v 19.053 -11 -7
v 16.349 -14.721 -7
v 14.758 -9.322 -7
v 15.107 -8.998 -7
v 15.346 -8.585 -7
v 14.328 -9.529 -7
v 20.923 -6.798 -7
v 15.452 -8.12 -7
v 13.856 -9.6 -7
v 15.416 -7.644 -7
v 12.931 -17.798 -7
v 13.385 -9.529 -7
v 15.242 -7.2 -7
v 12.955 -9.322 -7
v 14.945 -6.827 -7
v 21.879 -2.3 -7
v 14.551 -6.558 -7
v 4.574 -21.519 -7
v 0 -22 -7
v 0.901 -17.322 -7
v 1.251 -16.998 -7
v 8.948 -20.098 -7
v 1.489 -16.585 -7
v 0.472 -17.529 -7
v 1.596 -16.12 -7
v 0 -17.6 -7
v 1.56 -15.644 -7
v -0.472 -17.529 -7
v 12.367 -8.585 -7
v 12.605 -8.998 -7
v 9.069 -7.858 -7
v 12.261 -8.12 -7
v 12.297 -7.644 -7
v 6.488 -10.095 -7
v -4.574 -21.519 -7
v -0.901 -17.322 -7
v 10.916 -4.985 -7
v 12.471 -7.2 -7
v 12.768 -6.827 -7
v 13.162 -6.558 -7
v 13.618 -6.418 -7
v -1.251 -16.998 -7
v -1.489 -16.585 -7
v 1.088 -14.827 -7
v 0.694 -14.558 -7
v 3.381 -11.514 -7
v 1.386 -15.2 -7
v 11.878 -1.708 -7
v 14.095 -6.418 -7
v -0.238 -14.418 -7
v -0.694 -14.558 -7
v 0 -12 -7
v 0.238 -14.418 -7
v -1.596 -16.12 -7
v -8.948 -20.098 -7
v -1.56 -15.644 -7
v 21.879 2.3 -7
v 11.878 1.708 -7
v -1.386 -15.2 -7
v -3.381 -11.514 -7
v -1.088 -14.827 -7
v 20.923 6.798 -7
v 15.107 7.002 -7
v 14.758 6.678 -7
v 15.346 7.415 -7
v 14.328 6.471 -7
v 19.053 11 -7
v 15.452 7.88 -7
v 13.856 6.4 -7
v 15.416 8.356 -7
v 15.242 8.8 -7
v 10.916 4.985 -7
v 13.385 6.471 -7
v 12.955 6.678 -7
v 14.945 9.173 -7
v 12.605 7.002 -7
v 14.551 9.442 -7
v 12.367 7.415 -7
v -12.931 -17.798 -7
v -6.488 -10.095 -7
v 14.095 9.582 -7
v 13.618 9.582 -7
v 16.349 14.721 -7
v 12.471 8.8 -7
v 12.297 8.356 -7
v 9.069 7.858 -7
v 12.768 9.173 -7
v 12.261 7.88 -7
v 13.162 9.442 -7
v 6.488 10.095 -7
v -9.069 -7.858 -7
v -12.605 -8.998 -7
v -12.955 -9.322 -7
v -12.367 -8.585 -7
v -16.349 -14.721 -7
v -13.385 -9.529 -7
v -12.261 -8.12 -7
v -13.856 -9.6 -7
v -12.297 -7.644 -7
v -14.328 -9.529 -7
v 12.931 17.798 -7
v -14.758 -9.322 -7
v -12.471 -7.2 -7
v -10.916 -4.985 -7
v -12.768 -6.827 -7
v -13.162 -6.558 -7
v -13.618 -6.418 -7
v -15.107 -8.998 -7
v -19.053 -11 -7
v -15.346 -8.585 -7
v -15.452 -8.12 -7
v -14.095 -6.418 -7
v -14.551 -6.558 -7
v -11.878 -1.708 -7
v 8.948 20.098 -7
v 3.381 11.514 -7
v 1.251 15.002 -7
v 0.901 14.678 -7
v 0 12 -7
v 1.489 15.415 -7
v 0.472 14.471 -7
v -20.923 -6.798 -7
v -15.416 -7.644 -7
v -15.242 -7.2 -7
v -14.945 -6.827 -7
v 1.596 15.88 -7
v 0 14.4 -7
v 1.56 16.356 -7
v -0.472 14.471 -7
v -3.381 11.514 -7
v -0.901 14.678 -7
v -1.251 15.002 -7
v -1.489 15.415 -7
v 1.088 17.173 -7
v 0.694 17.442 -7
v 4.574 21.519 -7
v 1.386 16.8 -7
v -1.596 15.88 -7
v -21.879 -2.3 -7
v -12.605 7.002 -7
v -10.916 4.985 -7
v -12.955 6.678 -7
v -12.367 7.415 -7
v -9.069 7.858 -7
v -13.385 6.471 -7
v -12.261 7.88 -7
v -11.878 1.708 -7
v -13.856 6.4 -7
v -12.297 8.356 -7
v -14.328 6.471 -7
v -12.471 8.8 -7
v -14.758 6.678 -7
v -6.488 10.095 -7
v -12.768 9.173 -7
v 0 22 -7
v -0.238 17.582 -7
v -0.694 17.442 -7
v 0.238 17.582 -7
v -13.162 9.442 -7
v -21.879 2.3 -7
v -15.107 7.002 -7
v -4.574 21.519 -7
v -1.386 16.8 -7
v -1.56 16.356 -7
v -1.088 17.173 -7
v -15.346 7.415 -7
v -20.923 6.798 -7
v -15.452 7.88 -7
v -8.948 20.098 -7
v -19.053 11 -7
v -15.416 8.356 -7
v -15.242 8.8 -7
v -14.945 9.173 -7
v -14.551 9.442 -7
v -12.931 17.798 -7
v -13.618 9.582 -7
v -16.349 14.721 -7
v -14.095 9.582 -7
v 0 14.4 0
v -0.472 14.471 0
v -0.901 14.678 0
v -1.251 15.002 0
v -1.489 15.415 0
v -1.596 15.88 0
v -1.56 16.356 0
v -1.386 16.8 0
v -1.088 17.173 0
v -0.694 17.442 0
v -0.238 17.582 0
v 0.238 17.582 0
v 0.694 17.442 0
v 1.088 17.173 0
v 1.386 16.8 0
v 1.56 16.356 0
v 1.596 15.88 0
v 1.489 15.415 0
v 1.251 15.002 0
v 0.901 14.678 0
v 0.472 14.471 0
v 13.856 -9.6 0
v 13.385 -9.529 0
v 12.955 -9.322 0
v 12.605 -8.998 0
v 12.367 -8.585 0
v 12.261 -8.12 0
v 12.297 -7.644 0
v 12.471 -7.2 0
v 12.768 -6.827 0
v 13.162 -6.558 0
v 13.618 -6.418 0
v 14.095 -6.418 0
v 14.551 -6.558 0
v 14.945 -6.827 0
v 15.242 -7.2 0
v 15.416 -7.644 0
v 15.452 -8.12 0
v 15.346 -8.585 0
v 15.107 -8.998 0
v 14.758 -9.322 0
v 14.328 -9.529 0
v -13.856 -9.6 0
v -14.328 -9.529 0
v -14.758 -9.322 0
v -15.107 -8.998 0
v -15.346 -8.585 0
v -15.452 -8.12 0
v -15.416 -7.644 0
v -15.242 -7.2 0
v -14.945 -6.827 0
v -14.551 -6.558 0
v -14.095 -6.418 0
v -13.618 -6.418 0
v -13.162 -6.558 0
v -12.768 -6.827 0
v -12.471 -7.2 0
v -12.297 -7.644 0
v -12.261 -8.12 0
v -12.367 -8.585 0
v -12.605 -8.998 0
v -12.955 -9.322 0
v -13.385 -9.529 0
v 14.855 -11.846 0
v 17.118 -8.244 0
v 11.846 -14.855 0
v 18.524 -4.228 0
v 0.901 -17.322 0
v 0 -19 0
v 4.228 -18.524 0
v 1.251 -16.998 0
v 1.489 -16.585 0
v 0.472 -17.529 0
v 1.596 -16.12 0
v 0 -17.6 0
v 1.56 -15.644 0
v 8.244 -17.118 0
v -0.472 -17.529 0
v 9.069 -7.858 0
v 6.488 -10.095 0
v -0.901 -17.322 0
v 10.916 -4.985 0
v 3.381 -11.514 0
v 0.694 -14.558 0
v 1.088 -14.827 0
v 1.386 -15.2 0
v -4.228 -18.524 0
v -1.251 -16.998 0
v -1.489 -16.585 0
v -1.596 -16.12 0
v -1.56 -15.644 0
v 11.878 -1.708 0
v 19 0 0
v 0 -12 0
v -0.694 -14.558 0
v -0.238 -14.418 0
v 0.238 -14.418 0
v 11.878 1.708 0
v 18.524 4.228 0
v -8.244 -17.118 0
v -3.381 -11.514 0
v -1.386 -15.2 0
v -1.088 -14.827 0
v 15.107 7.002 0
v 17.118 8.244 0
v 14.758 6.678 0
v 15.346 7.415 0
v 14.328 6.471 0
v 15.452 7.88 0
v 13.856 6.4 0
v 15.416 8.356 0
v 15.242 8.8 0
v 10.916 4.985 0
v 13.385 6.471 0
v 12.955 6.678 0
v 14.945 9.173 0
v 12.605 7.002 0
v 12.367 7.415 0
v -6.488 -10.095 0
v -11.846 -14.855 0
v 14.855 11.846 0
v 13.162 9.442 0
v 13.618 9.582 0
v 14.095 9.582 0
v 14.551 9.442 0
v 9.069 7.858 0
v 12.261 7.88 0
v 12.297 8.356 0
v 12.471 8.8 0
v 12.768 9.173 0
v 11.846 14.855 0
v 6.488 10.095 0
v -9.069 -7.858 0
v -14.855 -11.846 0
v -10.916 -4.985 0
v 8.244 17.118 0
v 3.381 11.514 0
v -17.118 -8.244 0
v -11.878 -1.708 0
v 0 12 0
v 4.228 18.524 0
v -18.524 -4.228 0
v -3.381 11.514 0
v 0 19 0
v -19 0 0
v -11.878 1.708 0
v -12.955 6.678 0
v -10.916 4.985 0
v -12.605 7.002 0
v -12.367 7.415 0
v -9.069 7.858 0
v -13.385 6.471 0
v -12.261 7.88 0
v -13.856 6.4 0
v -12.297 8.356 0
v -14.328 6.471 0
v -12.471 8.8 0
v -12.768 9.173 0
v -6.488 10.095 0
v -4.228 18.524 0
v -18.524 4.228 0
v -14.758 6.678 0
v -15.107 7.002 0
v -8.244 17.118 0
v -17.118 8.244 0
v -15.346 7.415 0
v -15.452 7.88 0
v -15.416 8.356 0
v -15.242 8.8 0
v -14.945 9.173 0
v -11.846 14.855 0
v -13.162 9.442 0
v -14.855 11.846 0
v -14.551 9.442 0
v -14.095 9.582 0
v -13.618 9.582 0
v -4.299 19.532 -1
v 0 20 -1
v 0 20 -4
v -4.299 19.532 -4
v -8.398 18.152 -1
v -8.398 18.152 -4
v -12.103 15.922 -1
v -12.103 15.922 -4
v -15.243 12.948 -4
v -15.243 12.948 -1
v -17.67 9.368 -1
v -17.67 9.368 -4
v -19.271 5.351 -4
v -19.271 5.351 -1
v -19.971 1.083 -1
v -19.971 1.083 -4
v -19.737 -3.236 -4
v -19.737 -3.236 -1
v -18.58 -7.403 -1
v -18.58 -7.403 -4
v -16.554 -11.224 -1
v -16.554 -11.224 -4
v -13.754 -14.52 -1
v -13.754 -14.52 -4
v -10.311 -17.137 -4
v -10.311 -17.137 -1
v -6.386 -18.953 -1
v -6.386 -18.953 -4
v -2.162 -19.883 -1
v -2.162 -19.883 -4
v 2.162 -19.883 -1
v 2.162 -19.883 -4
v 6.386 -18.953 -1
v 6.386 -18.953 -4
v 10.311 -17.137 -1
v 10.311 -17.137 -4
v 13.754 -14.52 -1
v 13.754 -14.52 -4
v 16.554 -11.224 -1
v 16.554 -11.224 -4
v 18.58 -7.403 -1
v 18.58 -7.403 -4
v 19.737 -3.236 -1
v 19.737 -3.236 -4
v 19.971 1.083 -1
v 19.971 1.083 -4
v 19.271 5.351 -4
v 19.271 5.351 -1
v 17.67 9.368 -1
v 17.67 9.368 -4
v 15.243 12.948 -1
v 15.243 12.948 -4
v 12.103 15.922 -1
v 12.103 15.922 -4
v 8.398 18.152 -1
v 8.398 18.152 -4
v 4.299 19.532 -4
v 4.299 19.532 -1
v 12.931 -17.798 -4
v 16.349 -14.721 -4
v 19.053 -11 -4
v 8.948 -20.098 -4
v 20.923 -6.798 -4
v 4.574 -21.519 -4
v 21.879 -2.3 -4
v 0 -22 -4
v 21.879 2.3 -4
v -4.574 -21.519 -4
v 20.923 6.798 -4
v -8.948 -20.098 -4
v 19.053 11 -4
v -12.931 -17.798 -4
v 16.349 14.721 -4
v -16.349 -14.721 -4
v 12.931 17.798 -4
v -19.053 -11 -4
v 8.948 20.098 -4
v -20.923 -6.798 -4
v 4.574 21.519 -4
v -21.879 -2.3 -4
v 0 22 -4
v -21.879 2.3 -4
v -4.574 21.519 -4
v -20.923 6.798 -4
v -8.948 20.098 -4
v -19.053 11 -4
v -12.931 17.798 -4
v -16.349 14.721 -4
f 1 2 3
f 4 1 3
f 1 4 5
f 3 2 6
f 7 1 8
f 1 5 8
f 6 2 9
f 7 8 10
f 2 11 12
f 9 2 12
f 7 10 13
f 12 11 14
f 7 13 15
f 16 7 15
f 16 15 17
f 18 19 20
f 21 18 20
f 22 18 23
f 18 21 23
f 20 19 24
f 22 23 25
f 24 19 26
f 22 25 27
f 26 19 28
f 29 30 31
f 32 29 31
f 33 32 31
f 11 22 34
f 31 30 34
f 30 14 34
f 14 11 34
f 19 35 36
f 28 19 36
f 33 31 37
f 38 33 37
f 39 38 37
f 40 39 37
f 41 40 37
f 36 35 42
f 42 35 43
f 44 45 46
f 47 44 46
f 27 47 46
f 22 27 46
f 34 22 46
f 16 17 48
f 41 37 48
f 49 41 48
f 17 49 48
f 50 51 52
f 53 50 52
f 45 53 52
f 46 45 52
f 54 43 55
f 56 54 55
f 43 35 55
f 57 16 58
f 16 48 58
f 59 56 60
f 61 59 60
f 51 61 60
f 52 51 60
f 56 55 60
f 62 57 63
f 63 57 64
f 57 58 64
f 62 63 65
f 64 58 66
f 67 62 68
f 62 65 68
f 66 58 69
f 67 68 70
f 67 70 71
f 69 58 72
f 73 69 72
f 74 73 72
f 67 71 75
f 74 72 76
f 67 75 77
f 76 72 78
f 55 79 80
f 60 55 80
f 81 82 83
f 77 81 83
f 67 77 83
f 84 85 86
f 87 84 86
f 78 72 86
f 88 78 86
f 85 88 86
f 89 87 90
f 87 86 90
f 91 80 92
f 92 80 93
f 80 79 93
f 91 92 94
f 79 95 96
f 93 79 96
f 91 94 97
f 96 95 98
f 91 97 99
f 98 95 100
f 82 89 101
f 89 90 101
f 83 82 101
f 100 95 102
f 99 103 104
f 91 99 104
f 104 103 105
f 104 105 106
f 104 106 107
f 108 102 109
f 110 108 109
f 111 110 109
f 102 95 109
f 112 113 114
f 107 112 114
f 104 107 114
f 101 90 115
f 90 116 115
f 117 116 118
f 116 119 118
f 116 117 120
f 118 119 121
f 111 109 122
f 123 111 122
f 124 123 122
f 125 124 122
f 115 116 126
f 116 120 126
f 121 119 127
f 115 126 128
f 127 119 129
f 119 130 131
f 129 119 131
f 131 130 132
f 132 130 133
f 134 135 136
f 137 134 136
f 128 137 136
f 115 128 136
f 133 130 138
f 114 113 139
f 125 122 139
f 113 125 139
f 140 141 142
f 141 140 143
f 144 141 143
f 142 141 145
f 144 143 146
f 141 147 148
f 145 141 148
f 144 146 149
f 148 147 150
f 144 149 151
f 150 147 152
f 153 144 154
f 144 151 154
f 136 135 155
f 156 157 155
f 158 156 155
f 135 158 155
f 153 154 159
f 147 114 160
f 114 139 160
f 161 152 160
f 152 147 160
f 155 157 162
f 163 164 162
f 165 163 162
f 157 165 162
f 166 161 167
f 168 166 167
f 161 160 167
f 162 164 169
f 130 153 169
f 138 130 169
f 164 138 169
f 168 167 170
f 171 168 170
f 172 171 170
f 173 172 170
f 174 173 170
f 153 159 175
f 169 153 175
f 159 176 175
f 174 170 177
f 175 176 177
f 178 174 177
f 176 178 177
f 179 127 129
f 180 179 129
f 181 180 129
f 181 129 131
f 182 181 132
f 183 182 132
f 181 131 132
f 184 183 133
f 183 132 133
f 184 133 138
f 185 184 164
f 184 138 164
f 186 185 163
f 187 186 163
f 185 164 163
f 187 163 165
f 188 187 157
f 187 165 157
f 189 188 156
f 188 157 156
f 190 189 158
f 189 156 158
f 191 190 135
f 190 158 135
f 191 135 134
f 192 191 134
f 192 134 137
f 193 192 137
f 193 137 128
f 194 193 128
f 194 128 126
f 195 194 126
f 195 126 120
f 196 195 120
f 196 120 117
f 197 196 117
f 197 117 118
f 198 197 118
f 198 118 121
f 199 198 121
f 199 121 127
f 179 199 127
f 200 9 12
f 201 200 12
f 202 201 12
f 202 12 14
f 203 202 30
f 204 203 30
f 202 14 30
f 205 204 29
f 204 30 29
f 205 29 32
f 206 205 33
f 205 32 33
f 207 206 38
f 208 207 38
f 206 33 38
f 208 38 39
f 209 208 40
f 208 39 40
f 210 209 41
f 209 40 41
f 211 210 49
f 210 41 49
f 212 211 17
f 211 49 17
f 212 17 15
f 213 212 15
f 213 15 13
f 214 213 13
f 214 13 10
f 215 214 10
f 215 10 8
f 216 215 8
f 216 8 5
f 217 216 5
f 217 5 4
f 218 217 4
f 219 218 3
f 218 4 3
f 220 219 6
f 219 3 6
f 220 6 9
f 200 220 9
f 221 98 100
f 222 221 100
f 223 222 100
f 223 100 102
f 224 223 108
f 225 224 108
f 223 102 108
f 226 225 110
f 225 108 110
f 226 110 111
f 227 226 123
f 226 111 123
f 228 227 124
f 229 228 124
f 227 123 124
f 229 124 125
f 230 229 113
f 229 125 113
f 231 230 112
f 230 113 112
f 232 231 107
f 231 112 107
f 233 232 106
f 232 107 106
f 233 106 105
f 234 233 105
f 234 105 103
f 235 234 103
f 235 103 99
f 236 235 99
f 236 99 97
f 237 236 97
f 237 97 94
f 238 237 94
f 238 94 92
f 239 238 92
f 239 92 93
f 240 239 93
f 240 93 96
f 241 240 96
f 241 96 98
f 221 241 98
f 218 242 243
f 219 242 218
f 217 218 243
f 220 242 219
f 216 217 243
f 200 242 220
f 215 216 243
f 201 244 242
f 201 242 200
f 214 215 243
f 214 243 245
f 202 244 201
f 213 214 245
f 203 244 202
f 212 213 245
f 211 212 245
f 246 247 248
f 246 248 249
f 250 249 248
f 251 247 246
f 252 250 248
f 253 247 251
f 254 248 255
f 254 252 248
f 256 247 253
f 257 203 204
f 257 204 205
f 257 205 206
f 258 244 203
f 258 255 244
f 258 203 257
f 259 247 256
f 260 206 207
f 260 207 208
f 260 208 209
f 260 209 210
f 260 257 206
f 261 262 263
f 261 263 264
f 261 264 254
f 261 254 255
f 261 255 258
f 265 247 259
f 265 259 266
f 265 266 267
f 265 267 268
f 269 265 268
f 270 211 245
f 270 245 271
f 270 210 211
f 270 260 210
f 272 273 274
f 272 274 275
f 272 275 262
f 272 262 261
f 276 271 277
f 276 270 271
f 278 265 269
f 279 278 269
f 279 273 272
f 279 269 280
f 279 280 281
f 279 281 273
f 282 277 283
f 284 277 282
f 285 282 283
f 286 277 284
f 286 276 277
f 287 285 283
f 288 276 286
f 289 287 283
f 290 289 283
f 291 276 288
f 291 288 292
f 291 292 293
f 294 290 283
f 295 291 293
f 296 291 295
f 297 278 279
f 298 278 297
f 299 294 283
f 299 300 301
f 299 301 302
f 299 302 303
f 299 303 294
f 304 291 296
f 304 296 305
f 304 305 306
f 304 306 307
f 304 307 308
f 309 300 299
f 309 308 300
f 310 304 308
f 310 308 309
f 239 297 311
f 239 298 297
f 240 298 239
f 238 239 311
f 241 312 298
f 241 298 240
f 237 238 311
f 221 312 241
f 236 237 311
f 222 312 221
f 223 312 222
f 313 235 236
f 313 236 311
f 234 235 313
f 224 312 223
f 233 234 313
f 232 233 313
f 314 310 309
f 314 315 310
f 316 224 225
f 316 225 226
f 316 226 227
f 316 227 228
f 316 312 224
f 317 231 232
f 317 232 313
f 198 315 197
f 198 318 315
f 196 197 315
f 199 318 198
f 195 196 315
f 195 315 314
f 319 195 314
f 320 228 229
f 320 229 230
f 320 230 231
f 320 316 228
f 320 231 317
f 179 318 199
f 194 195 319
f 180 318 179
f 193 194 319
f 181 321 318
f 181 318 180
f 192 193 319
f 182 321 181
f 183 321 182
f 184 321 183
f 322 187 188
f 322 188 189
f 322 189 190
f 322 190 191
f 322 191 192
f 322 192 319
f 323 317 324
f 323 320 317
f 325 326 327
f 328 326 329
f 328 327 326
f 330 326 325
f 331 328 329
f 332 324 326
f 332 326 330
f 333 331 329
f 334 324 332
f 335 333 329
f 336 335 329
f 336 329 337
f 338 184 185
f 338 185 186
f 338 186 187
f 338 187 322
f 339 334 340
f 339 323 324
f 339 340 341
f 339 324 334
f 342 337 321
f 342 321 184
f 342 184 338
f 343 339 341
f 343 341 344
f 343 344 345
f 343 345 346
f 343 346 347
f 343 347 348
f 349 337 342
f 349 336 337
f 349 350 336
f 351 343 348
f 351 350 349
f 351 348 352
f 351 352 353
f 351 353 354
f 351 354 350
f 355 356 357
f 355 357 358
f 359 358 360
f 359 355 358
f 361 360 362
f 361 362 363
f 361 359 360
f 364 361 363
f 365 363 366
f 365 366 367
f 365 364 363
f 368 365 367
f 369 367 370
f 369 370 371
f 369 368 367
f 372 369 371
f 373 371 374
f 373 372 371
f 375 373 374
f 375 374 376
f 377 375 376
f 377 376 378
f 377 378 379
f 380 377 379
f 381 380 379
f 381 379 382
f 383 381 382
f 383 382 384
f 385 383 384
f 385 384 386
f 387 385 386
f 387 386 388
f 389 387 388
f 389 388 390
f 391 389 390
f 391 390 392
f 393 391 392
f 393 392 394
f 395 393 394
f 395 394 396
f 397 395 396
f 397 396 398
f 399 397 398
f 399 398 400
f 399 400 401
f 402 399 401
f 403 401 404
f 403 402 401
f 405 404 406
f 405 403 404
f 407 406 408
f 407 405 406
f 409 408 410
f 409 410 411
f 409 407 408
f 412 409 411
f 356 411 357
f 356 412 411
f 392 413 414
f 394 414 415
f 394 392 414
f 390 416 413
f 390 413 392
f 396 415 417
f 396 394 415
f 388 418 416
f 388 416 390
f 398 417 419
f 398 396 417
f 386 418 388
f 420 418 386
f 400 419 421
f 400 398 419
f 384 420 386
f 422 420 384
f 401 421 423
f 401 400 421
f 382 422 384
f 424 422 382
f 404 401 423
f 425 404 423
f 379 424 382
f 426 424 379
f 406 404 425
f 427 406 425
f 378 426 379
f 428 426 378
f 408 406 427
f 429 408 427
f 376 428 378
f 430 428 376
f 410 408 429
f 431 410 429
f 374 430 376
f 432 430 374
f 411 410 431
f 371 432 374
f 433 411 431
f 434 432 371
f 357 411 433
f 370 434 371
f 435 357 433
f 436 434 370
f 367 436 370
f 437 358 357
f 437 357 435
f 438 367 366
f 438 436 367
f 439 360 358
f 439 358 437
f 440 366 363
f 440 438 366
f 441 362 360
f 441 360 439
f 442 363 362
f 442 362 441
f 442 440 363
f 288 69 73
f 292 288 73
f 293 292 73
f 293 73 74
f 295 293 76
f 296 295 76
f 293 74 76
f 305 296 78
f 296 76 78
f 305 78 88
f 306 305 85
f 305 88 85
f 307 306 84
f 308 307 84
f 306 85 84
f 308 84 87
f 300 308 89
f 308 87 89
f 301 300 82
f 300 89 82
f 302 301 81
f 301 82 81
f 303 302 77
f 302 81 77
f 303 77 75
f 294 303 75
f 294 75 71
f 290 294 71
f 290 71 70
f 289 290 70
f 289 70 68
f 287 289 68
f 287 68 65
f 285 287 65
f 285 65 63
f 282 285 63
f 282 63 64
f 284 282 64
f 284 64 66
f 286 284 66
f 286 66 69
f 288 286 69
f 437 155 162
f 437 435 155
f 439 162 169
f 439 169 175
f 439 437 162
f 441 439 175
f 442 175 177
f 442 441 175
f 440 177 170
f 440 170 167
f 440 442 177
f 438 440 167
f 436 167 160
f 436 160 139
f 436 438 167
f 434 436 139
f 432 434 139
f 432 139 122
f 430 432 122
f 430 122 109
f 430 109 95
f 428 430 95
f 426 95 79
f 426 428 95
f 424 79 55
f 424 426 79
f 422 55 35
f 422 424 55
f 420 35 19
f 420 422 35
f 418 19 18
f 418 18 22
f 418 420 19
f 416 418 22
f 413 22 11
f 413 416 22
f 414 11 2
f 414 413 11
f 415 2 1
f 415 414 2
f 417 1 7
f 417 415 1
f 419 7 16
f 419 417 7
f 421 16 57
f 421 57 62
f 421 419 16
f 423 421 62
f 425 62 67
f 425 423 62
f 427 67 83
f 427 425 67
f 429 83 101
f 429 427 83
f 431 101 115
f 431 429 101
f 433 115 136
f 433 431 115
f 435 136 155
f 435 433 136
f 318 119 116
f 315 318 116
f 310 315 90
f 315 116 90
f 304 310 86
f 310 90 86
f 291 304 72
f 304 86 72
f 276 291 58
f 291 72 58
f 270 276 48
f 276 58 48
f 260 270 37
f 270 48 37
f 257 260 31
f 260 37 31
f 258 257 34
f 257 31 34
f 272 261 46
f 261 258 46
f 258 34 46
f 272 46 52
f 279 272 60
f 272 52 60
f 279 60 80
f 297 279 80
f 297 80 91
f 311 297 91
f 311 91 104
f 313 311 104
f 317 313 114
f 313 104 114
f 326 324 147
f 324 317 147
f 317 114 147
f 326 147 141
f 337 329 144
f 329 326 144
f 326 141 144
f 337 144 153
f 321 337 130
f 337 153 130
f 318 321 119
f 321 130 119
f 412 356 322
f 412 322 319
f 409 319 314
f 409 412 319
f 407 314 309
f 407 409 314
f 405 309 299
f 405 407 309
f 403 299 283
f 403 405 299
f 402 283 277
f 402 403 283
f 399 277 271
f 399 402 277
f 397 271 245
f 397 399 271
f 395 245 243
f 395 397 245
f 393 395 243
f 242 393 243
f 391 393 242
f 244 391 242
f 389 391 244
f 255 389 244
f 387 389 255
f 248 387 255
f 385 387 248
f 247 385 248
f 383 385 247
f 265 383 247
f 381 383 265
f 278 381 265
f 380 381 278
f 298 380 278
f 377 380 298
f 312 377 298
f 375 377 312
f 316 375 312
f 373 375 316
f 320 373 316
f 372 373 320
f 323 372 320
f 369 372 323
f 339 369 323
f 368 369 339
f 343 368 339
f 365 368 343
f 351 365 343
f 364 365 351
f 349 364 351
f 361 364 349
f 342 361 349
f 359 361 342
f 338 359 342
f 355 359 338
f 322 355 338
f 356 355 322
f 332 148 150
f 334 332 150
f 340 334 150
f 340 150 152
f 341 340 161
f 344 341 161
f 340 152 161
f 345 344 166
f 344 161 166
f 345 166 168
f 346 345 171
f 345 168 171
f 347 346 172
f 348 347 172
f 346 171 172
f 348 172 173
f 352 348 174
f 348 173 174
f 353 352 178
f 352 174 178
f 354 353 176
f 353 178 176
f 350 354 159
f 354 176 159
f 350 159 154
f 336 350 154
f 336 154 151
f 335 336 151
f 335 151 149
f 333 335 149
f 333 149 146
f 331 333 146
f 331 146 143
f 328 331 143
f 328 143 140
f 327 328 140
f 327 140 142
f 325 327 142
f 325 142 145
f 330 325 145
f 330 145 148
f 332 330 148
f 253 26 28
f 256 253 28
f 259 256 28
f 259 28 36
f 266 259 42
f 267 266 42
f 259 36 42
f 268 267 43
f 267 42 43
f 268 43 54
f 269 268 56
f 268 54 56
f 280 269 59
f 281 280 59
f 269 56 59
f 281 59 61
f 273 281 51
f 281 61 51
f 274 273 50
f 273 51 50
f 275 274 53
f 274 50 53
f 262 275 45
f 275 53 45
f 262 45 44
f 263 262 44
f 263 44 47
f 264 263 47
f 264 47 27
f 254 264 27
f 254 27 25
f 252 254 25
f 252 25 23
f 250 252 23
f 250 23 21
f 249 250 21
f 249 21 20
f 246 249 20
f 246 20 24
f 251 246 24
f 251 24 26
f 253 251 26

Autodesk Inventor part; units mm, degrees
ref_plane "YZ Plane" through (0, 0, 0) normal (1, 0, 0) x (0, 1, 0)
ref_plane "XZ Plane" through (0, 0, 0) normal (0, 1, 0) x (-1, 0, 0)
ref_plane "XY Plane" through (0, 0, 0) normal (0, 0, 1) x (1, 0, 0)
sketch "スケッチ1" plane through (0, 0, 0) normal (1, 0, 0) x (0, 1, 0)
  line L0 (12, 0) -> (12, -7)
  line L1 (22, -7) -> (22, -4)
  line L2 (22, -4) -> (20, -4)
  line L3 (20, -4) -> (20, 0)
  line L4 (20, 0) -> (12, 0)
  line L5 (0, -8.4) -> (0, 1.4) projected
  line L6 (22, -7) -> (12, -7)
  point P0 (0, 0)
  dimension "d0" = 20
  dimension "d1" = 2
  dimension "d2" = 4
  dimension "d3" = 3
  dimension "d4" = 8
revolve "回転1" add sketch "スケッチ1" angle 360 about axis through (0, 0, -10) along (0, 0, 1)
sketch "スケッチ2" plane through (0, 0, 0) normal (0, 0, 1) x (1, 0, 0)
  circle A0 centre (0, 0) radius 20 projected
  circle A1 centre (0, 0) radius 16
  point P0 (0, 16)
  point P1 (-13.8564, 8)
  point P2 (-13.8564, -8)
  point P3 (0, -16)
  point P4 (13.8564, -8)
  point P5 (13.8564, 8)
  dimension "d8" = 4
  dimension "d11" = 360
hole "穴1" at (0, 16, 0) at (-13.8564, 8, 0) at (-13.8564, -8, 0) at (0, -16, 0) at (13.8564, -8, 0) at (13.8564, 8, 0) direction (0, 0, -1) diameter 3.2 end through all clearance for "Socket Head Cap Screw" size "M3" standard "Ansi Metric M Profile"
chamfer "面取り1" distance 1 angle 45 1 edges at (0, -20, 0)
properties part number "base11" material "ABS プラスチック"
